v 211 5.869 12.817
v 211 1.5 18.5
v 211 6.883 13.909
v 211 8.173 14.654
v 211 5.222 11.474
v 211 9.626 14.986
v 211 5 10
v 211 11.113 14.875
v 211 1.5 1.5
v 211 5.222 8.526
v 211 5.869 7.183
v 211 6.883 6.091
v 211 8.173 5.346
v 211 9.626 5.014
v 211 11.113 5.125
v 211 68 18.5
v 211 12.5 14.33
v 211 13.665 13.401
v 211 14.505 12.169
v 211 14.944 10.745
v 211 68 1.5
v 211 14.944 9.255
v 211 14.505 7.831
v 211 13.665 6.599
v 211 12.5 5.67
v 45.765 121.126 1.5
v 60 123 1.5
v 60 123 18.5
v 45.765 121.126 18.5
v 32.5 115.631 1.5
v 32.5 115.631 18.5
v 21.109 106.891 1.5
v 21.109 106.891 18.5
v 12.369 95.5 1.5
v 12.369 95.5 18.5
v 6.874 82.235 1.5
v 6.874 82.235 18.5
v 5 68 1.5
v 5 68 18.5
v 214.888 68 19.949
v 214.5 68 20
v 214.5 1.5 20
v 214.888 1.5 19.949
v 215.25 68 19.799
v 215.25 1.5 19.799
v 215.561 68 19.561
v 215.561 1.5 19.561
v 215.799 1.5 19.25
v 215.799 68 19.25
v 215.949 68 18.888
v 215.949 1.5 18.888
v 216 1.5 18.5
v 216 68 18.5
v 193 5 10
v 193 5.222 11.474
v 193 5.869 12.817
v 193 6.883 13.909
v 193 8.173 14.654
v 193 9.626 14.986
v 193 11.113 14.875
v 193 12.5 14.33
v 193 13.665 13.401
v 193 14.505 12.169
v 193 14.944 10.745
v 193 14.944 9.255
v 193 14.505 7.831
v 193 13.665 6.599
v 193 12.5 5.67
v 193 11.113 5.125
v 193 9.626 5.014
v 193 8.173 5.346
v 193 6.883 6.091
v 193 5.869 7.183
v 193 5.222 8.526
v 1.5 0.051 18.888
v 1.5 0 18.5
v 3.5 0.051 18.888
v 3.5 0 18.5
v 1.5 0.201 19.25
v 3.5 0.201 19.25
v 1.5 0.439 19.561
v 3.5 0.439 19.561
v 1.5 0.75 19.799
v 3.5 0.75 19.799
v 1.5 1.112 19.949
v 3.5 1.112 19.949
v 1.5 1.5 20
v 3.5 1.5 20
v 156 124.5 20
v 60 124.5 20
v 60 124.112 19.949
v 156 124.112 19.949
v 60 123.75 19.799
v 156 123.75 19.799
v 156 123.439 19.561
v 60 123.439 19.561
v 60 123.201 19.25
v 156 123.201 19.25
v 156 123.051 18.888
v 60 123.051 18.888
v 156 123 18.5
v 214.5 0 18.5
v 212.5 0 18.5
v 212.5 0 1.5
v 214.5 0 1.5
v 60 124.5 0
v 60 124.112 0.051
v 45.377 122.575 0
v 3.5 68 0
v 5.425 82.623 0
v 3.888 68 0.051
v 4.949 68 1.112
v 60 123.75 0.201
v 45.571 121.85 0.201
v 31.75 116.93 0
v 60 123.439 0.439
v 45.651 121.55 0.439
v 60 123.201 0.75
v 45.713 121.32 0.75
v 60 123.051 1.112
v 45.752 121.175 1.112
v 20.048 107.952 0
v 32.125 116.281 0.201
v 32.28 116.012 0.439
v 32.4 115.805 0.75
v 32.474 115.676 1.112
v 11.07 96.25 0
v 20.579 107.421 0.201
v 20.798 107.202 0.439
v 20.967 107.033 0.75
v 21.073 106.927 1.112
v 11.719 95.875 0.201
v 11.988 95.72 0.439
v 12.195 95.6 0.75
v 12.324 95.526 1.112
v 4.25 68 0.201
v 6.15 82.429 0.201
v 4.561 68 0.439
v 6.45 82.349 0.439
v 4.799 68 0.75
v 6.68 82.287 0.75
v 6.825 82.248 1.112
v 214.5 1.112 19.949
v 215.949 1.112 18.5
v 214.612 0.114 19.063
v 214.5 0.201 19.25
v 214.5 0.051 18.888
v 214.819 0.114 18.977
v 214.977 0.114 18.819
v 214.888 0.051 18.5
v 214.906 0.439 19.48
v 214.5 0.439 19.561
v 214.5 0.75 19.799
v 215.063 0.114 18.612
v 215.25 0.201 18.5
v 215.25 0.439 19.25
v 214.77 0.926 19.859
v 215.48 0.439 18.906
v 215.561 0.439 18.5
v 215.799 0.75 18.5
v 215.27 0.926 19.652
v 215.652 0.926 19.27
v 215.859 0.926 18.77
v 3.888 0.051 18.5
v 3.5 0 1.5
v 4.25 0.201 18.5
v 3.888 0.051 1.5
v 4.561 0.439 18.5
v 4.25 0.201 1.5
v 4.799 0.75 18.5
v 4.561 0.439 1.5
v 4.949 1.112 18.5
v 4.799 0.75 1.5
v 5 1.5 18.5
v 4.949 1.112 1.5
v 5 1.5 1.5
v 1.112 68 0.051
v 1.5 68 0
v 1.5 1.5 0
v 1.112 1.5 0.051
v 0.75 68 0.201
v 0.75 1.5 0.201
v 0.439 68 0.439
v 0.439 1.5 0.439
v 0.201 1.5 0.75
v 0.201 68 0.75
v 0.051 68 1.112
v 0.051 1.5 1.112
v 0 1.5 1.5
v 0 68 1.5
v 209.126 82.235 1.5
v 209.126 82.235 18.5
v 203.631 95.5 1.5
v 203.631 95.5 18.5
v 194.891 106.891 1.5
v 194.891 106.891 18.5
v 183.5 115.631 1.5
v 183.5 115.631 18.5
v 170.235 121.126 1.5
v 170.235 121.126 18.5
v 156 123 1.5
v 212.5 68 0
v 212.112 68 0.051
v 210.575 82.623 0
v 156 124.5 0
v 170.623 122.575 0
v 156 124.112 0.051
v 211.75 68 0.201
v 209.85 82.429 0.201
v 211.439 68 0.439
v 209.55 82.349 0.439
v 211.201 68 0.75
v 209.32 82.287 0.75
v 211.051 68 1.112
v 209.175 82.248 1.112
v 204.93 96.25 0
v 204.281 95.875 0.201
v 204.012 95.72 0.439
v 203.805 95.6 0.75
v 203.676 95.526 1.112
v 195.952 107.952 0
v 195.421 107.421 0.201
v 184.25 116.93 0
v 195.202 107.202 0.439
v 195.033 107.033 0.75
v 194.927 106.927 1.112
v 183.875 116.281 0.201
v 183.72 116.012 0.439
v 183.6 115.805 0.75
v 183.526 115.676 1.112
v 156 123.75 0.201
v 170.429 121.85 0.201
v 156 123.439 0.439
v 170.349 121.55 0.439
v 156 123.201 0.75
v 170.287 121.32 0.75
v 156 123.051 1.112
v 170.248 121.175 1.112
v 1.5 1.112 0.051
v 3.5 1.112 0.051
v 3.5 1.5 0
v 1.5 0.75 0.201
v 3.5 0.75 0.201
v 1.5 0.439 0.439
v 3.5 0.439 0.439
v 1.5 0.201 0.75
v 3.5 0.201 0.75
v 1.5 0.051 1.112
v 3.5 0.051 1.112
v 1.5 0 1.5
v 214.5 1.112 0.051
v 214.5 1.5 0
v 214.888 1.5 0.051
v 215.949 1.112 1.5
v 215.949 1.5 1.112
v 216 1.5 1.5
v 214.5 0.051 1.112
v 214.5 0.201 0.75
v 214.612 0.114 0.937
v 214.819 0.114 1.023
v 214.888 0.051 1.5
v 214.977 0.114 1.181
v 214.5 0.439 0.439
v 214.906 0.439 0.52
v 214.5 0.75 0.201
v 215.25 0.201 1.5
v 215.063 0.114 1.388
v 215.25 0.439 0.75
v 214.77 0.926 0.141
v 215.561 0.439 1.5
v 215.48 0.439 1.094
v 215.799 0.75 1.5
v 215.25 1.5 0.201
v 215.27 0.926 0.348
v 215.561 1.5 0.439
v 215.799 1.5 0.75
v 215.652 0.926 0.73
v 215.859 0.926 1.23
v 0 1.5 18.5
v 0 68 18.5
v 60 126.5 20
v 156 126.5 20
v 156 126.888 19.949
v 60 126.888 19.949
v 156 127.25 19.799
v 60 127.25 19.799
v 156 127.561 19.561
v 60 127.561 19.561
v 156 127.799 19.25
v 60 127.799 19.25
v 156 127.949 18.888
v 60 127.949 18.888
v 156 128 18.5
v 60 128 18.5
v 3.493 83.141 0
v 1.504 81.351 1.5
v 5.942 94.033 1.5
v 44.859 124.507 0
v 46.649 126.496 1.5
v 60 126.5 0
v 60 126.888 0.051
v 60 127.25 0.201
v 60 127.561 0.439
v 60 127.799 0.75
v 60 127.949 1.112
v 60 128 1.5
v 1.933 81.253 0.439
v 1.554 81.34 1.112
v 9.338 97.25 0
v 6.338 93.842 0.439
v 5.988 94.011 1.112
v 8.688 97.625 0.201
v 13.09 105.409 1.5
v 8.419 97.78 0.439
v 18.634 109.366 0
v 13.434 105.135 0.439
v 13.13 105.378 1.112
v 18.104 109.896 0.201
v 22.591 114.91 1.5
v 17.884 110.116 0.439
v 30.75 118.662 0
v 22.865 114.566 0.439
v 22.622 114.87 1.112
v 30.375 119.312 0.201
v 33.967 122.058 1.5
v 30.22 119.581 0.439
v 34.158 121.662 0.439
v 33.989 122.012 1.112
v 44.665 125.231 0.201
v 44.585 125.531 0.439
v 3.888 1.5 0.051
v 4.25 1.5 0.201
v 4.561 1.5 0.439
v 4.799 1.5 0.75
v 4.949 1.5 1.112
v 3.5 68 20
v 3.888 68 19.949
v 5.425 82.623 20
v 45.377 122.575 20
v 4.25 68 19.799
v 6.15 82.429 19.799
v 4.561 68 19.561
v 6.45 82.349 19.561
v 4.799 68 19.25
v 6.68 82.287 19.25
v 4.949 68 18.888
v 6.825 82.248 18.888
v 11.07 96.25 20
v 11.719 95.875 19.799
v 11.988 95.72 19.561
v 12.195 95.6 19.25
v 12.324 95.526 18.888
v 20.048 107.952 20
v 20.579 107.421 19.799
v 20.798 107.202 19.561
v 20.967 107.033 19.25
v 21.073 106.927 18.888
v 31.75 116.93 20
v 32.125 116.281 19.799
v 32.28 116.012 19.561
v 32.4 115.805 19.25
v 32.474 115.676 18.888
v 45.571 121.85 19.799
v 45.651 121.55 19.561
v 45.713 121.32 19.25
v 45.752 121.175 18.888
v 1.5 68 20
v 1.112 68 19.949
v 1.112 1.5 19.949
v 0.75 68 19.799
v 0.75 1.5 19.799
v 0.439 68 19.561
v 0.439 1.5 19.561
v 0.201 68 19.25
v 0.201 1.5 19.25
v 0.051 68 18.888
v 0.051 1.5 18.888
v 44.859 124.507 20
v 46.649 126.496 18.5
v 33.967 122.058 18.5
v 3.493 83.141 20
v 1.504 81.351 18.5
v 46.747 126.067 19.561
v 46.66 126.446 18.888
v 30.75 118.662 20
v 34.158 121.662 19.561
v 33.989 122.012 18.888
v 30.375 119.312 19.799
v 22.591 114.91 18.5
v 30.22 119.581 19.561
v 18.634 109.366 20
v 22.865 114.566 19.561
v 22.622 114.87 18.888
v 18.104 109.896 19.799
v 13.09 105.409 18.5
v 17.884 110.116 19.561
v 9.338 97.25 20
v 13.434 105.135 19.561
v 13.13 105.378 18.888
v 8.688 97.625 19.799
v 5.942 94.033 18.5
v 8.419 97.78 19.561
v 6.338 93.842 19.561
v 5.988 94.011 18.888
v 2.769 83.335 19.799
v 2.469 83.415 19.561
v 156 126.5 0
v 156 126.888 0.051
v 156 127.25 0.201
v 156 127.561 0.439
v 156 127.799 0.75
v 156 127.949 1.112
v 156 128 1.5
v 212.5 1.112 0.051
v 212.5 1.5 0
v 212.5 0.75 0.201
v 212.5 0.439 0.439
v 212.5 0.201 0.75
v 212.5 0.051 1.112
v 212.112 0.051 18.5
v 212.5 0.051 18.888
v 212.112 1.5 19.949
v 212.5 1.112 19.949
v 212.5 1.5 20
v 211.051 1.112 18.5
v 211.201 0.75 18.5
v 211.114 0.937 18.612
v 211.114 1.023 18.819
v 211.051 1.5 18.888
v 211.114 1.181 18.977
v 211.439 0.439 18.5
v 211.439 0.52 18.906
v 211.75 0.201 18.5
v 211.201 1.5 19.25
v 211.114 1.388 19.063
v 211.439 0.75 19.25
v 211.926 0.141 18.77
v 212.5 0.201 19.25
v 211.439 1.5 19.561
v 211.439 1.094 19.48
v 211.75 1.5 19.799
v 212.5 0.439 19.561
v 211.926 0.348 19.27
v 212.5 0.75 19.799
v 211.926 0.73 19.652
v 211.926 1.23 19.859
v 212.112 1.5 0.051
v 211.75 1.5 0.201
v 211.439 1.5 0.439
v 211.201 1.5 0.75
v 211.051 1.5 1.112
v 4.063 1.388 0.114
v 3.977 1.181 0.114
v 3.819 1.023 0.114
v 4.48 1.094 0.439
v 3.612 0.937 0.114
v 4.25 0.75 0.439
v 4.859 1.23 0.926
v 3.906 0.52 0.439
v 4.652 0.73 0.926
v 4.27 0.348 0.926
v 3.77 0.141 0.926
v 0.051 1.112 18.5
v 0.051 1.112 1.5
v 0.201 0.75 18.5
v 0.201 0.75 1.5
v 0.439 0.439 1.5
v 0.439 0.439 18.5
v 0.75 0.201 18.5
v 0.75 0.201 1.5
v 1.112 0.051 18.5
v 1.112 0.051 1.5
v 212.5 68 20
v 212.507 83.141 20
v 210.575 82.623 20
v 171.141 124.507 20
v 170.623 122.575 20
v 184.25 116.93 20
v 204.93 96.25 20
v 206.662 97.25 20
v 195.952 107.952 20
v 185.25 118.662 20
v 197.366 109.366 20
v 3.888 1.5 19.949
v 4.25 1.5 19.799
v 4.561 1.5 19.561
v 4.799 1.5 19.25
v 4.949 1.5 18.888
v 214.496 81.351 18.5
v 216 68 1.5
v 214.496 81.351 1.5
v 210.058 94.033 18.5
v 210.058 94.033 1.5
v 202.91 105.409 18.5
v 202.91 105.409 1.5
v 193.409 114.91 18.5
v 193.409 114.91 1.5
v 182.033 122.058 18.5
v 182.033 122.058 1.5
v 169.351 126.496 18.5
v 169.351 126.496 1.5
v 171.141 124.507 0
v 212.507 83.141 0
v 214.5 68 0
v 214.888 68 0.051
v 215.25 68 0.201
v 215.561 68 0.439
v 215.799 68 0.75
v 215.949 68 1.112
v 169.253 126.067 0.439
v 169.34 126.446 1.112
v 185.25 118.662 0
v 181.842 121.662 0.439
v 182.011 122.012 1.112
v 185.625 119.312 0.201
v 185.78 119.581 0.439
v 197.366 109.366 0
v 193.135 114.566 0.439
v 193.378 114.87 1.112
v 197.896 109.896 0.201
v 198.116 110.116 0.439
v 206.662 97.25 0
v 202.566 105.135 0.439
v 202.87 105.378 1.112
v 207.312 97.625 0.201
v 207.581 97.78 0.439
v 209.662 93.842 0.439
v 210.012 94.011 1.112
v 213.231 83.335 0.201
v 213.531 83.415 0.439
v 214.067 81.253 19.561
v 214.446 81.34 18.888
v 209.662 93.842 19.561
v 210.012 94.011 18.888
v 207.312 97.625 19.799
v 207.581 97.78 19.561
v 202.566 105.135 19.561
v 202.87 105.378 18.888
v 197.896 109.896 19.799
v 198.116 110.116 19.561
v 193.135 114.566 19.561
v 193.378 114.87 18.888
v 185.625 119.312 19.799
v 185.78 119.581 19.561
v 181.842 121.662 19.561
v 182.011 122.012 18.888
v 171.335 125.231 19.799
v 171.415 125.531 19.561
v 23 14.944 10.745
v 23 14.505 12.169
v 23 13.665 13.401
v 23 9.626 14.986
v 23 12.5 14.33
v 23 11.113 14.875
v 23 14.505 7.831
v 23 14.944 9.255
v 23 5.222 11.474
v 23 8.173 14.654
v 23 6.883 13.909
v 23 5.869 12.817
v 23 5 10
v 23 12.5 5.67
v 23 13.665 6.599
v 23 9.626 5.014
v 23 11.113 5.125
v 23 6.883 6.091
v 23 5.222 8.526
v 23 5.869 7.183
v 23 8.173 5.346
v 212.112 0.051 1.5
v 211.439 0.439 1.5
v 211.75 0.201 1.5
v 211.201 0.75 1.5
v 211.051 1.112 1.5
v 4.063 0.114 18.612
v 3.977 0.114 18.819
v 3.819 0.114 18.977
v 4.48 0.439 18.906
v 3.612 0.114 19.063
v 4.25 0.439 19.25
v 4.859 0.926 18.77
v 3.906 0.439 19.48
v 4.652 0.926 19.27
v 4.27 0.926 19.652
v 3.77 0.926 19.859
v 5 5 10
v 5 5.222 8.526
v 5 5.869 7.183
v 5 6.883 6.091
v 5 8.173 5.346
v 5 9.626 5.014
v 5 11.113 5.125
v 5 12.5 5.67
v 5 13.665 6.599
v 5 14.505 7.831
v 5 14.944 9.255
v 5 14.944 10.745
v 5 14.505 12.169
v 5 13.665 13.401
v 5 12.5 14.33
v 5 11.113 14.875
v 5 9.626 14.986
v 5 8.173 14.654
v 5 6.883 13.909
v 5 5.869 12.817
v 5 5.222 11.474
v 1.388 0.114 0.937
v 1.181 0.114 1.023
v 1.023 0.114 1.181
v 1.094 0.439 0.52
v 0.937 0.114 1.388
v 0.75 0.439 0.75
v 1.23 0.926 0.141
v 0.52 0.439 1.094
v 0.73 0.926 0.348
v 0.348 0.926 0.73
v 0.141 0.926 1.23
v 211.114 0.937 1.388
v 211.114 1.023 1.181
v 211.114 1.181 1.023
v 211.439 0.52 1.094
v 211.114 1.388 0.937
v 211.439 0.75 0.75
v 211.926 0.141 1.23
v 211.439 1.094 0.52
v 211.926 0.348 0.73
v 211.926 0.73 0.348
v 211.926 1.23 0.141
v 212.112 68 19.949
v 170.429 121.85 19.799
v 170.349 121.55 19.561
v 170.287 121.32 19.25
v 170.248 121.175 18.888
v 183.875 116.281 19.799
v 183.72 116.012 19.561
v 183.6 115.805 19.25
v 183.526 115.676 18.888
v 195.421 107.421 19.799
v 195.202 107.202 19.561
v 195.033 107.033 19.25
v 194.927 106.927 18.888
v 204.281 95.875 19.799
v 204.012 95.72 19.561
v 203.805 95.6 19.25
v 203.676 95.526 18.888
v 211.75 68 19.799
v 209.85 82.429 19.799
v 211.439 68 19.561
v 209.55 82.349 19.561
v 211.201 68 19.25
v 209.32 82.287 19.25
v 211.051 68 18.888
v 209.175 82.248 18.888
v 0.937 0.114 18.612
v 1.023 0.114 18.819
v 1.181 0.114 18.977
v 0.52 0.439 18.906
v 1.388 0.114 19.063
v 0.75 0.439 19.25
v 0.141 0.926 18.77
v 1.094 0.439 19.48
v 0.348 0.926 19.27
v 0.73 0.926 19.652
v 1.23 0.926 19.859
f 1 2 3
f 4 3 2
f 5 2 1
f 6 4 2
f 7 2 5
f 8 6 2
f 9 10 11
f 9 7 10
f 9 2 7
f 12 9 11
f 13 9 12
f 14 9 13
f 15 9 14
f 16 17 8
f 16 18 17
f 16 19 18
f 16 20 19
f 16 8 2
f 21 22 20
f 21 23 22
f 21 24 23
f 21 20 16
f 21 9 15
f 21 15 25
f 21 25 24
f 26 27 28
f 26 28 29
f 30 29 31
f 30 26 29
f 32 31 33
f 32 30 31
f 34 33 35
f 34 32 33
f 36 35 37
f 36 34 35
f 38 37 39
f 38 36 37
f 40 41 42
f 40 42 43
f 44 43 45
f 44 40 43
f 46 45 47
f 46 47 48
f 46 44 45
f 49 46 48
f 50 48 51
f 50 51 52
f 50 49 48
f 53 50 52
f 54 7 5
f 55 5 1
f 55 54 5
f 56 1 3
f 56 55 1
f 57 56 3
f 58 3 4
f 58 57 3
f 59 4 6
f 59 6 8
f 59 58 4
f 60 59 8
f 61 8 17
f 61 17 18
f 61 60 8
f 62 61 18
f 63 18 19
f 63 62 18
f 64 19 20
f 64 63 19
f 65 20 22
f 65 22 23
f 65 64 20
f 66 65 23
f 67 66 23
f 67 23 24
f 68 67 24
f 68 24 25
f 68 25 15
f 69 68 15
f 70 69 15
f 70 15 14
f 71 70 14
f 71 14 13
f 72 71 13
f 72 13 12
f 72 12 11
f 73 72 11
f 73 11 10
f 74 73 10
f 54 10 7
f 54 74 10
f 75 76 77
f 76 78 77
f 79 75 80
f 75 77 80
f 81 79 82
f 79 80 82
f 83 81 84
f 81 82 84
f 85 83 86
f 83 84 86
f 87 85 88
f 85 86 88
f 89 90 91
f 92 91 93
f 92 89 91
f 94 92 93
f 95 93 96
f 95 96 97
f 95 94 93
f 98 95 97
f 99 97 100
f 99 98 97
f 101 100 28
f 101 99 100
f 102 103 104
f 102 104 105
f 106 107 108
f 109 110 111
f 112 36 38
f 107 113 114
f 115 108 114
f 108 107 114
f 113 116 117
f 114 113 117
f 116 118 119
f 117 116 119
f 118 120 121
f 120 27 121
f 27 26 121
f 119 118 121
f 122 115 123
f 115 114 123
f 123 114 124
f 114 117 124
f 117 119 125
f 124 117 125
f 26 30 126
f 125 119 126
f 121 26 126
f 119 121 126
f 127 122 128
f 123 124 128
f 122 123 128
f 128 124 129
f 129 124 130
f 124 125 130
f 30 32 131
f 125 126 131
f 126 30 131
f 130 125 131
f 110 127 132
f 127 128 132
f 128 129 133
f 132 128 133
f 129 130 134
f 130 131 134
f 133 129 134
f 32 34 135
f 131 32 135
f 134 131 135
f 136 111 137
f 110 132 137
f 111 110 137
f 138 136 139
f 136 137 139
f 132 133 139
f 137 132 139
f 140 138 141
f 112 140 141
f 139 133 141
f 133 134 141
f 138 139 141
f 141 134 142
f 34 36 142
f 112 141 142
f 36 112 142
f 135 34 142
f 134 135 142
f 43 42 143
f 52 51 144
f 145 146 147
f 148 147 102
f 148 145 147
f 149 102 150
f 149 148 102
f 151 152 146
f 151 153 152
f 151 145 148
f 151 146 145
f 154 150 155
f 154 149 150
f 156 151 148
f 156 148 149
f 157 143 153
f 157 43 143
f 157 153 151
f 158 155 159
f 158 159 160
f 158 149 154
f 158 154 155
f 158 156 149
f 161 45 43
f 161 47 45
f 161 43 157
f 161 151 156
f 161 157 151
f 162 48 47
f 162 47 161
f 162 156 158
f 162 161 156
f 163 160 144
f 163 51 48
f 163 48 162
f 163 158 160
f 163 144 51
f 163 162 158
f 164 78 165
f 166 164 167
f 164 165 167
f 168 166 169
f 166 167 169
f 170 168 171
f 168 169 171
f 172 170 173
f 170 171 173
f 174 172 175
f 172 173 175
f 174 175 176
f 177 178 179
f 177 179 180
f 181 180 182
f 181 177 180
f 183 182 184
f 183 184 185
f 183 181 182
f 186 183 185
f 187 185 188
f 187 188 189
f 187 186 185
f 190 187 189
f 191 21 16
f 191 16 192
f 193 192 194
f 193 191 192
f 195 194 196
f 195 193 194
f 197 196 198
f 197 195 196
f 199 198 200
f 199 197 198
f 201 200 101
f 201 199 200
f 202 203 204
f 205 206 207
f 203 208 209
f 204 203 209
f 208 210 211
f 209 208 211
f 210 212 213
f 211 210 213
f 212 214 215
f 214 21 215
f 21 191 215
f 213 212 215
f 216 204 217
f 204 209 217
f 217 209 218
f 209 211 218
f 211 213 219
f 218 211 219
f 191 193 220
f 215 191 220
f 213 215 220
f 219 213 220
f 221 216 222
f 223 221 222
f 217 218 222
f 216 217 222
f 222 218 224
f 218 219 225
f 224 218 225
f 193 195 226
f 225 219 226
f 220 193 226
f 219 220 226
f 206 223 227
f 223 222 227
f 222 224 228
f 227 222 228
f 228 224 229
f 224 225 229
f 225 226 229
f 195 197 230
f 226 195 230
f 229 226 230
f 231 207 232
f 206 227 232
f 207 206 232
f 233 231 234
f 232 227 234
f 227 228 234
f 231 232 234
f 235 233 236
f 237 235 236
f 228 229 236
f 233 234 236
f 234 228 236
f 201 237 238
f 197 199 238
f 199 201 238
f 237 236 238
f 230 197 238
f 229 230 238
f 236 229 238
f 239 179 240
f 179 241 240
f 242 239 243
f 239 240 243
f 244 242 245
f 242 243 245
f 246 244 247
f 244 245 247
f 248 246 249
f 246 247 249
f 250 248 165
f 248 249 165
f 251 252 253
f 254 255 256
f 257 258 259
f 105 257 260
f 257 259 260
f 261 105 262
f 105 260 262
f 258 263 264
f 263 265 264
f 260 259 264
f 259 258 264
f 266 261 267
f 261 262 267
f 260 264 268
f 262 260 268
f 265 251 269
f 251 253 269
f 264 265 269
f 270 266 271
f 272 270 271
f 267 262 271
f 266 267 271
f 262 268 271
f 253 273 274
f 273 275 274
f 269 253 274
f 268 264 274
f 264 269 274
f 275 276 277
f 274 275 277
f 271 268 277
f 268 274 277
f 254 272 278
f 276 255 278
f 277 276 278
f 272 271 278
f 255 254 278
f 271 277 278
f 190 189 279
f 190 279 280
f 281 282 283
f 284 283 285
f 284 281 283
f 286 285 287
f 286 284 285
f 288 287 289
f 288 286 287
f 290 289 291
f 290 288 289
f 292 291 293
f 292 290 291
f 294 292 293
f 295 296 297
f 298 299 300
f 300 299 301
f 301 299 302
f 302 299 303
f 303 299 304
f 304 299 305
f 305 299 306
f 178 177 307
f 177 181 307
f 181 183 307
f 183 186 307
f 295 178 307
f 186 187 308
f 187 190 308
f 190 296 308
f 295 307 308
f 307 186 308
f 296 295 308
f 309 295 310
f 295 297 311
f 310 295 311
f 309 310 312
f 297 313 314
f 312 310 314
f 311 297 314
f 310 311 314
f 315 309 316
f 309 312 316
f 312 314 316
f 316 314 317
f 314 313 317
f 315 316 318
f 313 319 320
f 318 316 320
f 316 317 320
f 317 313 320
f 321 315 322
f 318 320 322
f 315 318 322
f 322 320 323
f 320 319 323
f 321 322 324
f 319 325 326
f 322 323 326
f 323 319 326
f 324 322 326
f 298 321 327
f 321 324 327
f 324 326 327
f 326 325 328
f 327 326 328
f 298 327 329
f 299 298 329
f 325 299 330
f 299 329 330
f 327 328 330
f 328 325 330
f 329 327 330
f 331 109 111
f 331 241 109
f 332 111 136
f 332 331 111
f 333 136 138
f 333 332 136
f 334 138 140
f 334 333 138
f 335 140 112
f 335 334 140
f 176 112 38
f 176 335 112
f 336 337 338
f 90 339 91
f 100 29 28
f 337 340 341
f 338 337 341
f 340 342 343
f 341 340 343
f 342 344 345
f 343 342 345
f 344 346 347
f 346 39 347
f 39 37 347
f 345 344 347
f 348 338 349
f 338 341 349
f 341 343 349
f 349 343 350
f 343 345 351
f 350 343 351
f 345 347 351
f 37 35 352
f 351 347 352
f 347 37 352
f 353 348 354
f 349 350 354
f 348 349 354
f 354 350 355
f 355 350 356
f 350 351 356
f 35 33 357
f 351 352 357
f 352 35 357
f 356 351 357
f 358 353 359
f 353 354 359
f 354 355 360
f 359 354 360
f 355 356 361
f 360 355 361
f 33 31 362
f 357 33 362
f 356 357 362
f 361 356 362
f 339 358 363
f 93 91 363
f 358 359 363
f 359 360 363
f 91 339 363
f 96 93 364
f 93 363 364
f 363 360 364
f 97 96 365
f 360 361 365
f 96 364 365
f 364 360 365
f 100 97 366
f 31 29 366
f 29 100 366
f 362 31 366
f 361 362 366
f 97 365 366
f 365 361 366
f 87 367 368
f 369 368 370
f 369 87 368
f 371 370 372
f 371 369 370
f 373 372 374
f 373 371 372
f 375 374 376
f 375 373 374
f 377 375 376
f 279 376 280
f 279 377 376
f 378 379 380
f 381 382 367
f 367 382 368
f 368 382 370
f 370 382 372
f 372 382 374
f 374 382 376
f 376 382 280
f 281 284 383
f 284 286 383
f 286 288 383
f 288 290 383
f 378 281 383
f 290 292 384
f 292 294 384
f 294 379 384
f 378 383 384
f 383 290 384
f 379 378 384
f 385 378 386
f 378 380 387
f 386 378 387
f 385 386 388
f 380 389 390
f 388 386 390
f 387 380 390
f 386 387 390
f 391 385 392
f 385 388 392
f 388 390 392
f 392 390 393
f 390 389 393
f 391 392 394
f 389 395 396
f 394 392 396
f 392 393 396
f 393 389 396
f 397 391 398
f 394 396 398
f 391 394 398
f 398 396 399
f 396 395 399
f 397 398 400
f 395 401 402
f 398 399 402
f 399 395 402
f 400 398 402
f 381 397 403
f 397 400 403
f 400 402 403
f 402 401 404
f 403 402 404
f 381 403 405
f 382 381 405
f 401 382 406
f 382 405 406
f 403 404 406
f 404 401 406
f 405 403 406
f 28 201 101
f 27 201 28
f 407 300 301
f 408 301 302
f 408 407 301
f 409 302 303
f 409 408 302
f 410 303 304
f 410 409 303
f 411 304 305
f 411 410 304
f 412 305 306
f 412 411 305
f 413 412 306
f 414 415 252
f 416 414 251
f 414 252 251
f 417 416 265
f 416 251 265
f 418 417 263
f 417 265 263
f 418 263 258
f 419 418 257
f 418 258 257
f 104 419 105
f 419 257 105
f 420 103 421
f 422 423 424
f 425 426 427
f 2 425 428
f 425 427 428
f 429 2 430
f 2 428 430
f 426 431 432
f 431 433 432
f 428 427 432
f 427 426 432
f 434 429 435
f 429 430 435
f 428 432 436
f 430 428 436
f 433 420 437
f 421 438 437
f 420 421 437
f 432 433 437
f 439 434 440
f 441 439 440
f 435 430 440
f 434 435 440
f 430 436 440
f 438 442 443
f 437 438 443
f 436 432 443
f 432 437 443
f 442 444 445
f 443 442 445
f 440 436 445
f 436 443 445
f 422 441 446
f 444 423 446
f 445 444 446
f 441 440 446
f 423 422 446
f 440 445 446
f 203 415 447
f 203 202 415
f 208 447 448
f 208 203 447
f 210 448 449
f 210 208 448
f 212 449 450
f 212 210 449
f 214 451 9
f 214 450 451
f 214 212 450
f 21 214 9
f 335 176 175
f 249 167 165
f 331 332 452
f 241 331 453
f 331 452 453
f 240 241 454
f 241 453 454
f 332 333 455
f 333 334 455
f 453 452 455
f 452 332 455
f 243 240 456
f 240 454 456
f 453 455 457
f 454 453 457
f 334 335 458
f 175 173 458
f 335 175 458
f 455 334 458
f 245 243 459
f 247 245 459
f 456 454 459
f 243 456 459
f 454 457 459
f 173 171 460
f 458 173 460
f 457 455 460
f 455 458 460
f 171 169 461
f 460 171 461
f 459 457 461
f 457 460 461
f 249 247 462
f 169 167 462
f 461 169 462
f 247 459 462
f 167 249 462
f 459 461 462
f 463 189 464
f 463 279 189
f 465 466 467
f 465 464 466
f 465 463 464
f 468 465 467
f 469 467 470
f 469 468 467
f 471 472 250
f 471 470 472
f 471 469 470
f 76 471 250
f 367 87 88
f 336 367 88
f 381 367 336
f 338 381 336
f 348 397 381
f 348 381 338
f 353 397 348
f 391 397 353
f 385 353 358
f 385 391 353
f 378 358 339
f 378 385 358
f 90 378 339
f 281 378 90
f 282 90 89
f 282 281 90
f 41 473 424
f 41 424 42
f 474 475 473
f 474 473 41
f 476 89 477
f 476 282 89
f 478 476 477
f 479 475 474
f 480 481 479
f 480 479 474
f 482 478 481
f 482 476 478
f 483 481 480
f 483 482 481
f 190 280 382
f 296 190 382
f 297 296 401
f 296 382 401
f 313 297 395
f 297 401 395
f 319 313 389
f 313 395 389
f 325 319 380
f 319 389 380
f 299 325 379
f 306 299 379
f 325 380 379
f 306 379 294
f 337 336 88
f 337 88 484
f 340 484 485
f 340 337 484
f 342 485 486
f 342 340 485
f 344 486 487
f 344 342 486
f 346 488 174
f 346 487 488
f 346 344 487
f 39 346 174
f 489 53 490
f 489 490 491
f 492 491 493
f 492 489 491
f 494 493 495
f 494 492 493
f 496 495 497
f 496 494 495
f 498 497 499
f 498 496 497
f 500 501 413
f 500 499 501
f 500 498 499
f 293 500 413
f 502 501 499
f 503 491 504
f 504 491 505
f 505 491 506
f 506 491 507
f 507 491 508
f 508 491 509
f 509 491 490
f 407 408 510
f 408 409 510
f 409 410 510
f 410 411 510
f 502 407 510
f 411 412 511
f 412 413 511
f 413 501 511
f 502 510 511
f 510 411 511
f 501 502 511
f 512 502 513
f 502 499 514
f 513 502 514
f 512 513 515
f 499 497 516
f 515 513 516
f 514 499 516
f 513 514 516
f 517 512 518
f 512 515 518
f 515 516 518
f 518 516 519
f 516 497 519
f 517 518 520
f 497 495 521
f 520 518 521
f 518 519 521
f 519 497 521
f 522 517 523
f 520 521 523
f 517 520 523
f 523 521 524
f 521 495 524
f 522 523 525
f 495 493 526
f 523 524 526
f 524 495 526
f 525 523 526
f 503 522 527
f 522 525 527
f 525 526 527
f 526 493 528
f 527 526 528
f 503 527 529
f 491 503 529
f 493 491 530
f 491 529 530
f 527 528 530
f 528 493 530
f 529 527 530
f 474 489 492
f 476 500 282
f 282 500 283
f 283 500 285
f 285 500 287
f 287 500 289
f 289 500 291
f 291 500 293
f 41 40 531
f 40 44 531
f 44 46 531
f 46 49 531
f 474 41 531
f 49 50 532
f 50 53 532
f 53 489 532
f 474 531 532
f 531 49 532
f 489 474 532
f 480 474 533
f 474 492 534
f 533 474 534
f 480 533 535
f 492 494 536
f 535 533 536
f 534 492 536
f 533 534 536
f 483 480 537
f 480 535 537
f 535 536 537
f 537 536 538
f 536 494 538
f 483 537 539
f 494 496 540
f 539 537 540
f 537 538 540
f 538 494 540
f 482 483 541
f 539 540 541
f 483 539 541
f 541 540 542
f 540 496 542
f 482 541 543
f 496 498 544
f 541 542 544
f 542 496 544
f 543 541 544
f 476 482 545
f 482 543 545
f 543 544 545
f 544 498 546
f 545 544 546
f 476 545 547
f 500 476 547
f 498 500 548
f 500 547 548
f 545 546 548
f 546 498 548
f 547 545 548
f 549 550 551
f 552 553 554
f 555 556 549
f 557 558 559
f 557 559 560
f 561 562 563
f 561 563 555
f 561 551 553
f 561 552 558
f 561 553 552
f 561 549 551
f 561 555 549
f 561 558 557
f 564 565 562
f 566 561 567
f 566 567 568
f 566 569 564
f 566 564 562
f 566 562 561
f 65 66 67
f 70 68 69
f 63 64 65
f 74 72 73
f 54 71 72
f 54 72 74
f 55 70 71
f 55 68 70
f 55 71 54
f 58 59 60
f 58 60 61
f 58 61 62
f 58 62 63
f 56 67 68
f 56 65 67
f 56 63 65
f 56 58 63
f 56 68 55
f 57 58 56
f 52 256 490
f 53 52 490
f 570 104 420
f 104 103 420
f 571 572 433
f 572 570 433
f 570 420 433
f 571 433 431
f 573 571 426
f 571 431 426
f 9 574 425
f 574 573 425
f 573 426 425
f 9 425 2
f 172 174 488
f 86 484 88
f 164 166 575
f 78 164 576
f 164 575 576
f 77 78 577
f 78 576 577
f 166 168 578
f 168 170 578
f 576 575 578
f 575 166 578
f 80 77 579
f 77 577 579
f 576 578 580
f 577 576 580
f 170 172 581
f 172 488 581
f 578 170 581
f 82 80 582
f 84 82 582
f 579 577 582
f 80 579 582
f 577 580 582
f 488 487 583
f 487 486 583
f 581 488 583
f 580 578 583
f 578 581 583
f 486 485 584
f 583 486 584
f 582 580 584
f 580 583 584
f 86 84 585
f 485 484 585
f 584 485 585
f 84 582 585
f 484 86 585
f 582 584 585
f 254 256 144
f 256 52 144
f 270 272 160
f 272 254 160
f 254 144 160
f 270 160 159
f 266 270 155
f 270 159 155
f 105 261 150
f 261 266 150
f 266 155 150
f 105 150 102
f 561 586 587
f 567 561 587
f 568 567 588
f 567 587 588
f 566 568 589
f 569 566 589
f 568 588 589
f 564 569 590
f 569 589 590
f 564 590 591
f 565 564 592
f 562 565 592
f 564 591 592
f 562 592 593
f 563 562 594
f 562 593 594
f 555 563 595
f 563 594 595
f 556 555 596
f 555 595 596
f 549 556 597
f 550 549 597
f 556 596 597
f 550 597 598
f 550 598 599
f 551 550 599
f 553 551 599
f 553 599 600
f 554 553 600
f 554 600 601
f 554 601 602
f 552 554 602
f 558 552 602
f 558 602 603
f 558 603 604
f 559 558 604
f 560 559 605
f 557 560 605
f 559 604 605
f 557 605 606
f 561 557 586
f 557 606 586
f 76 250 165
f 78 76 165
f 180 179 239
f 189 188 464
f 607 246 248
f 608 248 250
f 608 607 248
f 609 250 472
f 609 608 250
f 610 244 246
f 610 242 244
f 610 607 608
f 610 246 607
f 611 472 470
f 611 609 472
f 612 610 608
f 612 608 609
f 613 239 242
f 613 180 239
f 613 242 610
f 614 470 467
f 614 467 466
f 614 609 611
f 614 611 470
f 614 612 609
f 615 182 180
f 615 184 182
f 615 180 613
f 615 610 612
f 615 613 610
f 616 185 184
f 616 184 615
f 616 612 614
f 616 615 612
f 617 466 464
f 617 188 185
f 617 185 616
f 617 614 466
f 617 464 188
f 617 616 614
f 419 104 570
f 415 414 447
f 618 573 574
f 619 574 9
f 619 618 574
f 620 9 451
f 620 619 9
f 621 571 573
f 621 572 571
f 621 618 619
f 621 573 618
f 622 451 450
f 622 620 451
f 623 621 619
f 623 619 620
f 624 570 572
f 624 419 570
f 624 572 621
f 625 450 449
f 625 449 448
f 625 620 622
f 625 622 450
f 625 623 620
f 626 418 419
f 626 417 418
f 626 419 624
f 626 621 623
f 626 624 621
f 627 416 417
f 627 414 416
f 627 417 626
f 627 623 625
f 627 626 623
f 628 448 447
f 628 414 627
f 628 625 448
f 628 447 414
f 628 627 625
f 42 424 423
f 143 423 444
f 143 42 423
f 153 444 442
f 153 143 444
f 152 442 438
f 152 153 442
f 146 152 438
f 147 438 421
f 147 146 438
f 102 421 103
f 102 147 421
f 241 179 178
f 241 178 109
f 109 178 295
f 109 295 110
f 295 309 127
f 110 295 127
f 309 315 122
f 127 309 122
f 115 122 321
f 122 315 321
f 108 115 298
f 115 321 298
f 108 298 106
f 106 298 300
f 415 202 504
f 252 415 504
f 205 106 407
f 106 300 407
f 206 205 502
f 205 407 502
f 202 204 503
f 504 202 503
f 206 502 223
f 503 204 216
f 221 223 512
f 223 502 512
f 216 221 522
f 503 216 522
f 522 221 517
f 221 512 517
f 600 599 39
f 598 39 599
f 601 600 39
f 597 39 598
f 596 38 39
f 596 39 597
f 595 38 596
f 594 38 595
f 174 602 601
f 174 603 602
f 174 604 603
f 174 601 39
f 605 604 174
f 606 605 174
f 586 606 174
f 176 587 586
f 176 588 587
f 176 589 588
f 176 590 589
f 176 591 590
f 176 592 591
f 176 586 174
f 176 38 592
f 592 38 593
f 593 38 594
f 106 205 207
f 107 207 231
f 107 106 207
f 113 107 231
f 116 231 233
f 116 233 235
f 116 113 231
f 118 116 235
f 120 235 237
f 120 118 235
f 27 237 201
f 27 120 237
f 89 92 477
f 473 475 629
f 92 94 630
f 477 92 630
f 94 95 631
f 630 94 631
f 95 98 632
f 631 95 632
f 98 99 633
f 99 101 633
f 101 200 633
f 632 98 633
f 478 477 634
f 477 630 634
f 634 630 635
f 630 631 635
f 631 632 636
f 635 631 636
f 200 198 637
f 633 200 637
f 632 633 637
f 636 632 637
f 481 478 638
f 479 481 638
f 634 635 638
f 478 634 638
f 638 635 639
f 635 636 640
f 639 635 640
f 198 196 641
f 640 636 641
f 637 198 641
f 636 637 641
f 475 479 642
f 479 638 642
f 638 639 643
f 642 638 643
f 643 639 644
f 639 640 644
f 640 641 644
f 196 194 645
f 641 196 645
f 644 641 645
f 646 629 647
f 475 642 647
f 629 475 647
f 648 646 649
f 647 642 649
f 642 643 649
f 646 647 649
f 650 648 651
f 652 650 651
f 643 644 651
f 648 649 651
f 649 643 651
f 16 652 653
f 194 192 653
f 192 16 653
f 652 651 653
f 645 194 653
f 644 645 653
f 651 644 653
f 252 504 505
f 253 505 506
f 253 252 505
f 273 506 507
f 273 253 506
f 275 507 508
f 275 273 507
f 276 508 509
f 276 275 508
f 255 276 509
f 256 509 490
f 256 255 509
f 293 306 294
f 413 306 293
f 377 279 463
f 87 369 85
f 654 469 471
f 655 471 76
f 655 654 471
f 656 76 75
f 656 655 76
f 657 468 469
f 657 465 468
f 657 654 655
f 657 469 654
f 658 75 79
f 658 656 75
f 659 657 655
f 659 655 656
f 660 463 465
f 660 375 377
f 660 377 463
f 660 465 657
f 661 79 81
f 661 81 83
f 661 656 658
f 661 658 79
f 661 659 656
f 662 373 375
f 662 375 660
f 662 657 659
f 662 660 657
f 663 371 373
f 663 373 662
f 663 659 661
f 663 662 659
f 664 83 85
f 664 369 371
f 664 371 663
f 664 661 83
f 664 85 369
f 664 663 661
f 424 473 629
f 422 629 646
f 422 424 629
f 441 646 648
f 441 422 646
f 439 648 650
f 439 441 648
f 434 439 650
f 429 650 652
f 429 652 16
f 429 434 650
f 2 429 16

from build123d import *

# Parameters (mm, degrees)
SKETCH_2_W               = 216
SKETCH_2_H               = 128
EXTRUDE_1_DEPTH          = 20
FILLET_1_R               = 60
CUT_EXTRUDE_1_DEPTH      = 252.872983863
CUT_EXTRUDE_1_DEPTH_BACK = 20
SKETCH_4_R               = 5
EXTRUDE_2_DEPTH          = 18
EXTRUDE_START            = 18
SKETCH_5_R               = 5
EXTRUDE_3_DEPTH          = 18
FILLET_2_R               = 1.5


with BuildPart() as part:
    # ｽｹｯﾁ2 → ﾎﾞｽ - 押し出し1 (new body)
    with BuildSketch(Plane.XY):
        with Locations((108, 64)):
            Rectangle(SKETCH_2_W, SKETCH_2_H)
    extrude(amount=EXTRUDE_1_DEPTH)

    # ﾌｨﾚｯﾄ1
    fillet_1_edges = [part.edges().sort_by_distance(p)[0] for p in [
        (0, 128, 10),
        (216, 128, 10),
    ]]
    fillet(fillet_1_edges, radius=FILLET_1_R)

    # ｽｹｯﾁ3 → ｶｯﾄ - 押し出し1 (cut, two sides: drawn at the far end of the back side and taken through both)
    with BuildSketch(Plane.XY.offset(20).offset(-CUT_EXTRUDE_1_DEPTH_BACK)):
        with BuildLine():
            Line((211, -503.578767777), (211, 0))
            Line((211, 0), (211, 68))
            ThreePointArc((211, 68), (194.890872965, 106.890872965), (156, 123))
            Line((156, 123), (60, 123))
            ThreePointArc((60, 123), (21.109127035, 106.890872965), (5, 68))
            Line((5, 68), (5, 0))
            Line((5, 0), (5, -503.578767777))
            Line((5, -503.578767777), (5, -1510.73630333))
            Line((5, -1510.73630333), (211, -1510.73630333))
            Line((211, -1510.73630333), (211, -503.578767777))
        make_face()
    extrude(amount=CUT_EXTRUDE_1_DEPTH + CUT_EXTRUDE_1_DEPTH_BACK, mode=Mode.SUBTRACT)

    # ｽｹｯﾁ4 → ﾎﾞｽ - 押し出し2 (add)
    with BuildSketch(Plane(origin=(5, 0, 0), x_dir=(0, 0, -1), z_dir=(1, 0, 0))):
        with Locations(Location((-10, 10, 0), (0, 0, 270))):
            Circle(SKETCH_4_R)
    extrude(amount=EXTRUDE_2_DEPTH)

    # ｽｹｯﾁ5 → ﾎﾞｽ - 押し出し3 (add)
    with BuildSketch(Plane.ZY.offset(-211).offset(EXTRUDE_START)):
        with Locations(Location((10, 10, 0), (0, 0, 270))):
            Circle(SKETCH_5_R)
    extrude(amount=-EXTRUDE_3_DEPTH)

    # ﾌｨﾚｯﾄ2
    fillet_2_edges = [part.edges().sort_by_distance(p)[0] for p in [
        (216, 34, 20),
        (108, 128, 0),
        (108, 128, 20),
        (0, 34, 0),
        (17.573593129, 110.426406871, 0),
        (198.426406871, 110.426406871, 0),
        (0, 34, 20),
        (17.573593129, 110.426406871, 20),
        (198.426406871, 110.426406871, 20),
        (213.5, 0, 0),
        (213.5, 0, 20),
        (211, 0, 10),
        (211, 34, 20),
        (194.890872965, 106.890872965, 20),
        (108, 123, 20),
        (21.109127035, 106.890872965, 20),
        (5, 34, 20),
        (5, 0, 10),
        (5, 34, 0),
        (211, 34, 0),
        (194.890872965, 106.890872965, 0),
        (108, 123, 0),
        (21.109127035, 106.890872965, 0),
        (216, 34, 0),
        (2.5, 0, 0),
        (216, 0, 10),
        (0, 0, 10),
        (2.5, 0, 20),
    ]]
    fillet(fillet_2_edges, radius=FILLET_2_R)


solid = part.part
